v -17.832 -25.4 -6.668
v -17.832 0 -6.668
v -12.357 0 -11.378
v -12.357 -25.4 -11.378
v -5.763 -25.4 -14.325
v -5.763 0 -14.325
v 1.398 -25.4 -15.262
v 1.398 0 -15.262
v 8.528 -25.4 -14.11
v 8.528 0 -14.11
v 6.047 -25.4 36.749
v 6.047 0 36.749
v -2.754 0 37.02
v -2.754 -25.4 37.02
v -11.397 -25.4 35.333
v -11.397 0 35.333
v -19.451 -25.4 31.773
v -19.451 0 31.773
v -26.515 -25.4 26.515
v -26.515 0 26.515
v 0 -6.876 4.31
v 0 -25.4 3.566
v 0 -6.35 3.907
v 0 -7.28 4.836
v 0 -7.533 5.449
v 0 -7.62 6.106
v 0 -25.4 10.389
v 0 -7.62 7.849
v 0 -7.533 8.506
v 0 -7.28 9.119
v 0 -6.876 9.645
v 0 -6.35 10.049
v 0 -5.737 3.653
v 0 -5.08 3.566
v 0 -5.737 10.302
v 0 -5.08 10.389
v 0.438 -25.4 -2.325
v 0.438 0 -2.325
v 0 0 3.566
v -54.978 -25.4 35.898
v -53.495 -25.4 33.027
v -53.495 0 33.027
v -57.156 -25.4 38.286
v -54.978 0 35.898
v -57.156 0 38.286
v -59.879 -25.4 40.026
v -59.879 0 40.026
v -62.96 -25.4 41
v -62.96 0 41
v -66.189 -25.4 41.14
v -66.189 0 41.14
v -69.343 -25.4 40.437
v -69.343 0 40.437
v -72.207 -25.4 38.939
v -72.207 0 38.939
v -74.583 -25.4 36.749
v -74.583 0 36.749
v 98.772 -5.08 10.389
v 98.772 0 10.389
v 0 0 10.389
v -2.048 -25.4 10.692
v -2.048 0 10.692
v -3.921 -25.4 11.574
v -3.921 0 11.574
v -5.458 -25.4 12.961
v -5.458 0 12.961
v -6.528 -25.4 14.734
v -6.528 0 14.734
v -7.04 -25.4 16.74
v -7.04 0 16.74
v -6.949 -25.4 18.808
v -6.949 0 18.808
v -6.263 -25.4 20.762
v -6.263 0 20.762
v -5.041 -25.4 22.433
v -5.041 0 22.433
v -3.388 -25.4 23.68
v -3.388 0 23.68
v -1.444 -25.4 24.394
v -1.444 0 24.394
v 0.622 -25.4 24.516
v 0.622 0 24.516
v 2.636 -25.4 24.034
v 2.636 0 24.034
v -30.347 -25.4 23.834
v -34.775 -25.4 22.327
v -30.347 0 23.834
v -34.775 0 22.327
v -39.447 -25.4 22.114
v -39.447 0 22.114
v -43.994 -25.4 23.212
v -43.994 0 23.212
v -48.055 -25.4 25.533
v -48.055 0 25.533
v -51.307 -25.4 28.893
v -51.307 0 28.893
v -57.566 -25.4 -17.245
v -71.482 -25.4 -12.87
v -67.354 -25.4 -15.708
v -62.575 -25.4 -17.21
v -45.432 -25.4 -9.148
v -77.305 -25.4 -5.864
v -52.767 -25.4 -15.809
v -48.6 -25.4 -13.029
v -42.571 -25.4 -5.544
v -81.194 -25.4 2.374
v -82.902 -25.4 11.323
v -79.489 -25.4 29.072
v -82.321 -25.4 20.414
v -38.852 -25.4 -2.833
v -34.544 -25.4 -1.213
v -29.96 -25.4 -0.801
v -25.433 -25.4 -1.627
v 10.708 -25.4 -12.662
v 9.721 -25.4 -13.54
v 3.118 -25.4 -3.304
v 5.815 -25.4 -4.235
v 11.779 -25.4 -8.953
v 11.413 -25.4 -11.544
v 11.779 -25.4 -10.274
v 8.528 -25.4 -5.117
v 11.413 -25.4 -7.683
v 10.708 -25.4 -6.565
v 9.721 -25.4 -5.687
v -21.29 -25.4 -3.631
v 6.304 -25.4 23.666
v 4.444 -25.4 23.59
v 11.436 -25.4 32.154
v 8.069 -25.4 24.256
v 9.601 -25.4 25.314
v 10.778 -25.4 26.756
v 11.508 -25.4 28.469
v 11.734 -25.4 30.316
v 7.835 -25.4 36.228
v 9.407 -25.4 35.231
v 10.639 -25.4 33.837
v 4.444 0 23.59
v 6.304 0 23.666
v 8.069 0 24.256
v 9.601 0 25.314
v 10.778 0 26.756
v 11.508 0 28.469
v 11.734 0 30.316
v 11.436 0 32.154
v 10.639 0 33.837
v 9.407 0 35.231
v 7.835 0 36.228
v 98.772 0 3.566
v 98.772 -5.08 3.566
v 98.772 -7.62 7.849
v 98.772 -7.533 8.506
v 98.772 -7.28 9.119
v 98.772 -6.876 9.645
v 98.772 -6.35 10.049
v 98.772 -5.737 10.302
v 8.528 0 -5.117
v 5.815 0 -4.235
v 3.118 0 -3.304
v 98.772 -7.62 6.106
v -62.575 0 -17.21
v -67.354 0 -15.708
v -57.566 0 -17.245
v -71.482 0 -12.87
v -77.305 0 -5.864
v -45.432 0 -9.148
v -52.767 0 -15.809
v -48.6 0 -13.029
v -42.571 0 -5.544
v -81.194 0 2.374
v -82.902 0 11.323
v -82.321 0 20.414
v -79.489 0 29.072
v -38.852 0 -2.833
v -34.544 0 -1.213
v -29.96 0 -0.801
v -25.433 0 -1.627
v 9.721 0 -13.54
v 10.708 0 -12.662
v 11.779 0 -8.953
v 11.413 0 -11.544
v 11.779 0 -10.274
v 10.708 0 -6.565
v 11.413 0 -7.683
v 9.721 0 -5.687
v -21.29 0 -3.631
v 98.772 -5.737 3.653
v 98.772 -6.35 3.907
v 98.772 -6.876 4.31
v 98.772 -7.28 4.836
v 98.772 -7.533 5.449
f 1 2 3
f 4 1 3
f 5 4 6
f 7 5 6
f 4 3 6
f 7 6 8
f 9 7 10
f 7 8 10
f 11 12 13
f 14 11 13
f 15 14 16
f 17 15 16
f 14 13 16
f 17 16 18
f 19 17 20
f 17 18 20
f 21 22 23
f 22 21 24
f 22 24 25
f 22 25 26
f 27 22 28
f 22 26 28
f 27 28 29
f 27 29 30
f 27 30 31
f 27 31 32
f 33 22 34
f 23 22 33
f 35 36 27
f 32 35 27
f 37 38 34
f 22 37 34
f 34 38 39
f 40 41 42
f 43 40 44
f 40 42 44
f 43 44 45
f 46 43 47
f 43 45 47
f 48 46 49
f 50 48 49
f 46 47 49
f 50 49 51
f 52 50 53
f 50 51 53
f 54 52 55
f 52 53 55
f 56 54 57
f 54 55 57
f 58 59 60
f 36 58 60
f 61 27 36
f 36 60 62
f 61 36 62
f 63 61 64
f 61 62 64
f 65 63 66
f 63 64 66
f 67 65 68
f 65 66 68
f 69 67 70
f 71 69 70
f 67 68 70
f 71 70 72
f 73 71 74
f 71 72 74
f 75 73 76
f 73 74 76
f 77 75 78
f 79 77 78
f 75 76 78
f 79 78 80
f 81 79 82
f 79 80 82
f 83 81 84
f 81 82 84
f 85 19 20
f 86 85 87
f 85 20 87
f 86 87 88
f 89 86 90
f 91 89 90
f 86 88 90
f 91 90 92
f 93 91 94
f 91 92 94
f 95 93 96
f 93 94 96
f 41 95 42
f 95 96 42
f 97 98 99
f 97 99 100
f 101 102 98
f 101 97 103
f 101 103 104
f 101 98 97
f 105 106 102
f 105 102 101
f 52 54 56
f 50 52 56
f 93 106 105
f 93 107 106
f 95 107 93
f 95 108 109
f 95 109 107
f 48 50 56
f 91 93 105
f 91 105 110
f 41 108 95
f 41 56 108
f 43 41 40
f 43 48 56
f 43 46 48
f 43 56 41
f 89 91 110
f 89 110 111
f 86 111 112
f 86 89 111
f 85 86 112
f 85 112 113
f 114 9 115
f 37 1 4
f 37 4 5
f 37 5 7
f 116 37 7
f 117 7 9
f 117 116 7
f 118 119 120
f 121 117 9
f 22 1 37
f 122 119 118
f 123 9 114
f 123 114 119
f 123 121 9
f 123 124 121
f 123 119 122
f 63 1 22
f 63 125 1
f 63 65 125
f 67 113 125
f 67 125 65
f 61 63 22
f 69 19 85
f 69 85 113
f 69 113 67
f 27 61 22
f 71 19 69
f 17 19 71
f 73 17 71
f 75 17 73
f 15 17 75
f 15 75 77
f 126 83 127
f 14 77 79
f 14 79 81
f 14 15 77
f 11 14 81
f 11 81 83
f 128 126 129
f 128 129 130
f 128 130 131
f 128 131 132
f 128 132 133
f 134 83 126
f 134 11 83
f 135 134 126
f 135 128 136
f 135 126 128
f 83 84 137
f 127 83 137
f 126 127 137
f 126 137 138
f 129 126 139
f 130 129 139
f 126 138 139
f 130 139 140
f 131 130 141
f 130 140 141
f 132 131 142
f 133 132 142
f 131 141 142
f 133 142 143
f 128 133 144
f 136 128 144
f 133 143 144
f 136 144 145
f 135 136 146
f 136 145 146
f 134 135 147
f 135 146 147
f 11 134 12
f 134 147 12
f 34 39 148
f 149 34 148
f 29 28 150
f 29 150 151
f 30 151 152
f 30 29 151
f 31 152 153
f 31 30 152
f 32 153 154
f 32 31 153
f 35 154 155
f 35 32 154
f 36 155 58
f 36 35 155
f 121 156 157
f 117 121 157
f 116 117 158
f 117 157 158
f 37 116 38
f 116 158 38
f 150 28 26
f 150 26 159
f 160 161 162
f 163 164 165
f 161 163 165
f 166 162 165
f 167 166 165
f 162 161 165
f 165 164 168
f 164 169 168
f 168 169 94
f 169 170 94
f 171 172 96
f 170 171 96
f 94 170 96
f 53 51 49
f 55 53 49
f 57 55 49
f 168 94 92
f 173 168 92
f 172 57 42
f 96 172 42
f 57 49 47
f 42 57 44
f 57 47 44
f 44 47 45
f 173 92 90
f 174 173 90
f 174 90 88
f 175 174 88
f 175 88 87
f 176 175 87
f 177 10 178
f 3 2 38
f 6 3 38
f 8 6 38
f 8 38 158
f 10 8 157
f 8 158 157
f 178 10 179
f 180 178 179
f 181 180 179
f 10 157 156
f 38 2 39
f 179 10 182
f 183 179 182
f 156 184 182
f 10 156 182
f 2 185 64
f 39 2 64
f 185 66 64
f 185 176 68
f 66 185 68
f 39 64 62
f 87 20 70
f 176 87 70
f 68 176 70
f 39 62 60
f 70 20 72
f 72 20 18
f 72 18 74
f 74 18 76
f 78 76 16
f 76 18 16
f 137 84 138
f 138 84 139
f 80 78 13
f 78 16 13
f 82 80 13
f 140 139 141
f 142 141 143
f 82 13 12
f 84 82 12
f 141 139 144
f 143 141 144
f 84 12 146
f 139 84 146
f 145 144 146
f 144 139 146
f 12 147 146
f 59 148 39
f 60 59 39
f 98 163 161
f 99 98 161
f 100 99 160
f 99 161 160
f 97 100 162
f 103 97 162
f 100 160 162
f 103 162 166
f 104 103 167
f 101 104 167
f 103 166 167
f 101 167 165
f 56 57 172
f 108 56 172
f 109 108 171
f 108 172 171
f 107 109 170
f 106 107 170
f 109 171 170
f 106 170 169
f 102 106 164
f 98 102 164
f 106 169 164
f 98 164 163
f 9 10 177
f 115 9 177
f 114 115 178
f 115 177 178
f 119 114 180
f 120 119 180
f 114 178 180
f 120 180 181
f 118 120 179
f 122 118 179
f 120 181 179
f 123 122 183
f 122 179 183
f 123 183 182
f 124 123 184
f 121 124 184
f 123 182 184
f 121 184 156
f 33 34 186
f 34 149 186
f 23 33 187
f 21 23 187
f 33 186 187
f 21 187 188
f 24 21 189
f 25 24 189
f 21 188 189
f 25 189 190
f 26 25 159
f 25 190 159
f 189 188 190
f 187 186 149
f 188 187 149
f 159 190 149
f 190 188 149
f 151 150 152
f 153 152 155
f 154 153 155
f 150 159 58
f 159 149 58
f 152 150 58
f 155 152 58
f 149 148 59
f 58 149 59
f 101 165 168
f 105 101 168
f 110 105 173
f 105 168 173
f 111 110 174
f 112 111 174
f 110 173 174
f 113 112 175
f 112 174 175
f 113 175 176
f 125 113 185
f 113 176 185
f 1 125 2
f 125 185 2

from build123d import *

# Parameters (mm, degrees)
F1_DEPTH = 25.4
F2_DEPTH = 7.62
F3_R     = 2.54


with BuildPart() as f1:
    # F0 (on Front) → F1 (new body)
    with BuildSketch(Plane.XZ):
        with BuildLine():
            Line((0, 3.566337), (0, 10.388896))
            ThreePointArc((0, 10.388896), (-6.948698, 18.80843), (2.63599, 24.034012))
            ThreePointArc((2.63599, 24.034012), (11.508331, 28.468624), (6.047268, 36.748782))
            ThreePointArc((6.047268, 36.748782), (-11.397136, 35.333267), (-26.514942, 26.514944))
            ThreePointArc((-26.514942, 26.514944), (-41.759535, 22.502372), (-53.495057, 33.027384))
            ThreePointArc((-53.495057, 33.027384), (-62.960481, 40.999747), (-74.582964, 36.748782))
            ThreePointArc((-74.582964, 36.748782), (-82.902194, 11.322615), (-71.481802, -12.869826))
            ThreePointArc((-71.481802, -12.869826), (-57.566104, -17.244824), (-45.432035, -9.14843))
            ThreePointArc((-45.432035, -9.14843), (-32.266086, -0.852213), (-17.831687, -6.6675))
            ThreePointArc((-17.831687, -6.6675), (-5.763119, -14.325014), (8.528198, -14.11029))
            ThreePointArc((8.528198, -14.11029), (11.825983, -9.613605), (8.528198, -5.116919))
            ThreePointArc((8.528198, -5.116919), (4.464289, -3.775638), (0.438227, -2.324702))
            Line((0.438227, -2.324702), (0, 3.566337))
        make_face()
    extrude(amount=F1_DEPTH)

    # F0 (on Front) → F2 (join)
    with BuildSketch(Plane.XZ):
        Polygon((91.329239, 10.388896), (0, 10.388896), (0, 3.566337), (98.772034, 3.566337), (98.772034, 10.388896), align=None)
    extrude(amount=F2_DEPTH)

    # F3
    f3_edges = [f1.edges().sort_by_distance(p)[0] for p in [
        (49.386017, -7.62, 3.566337),
        (49.386017, -7.62, 10.388896),
    ]]
    fillet(f3_edges, radius=F3_R)


solid = f1.part
